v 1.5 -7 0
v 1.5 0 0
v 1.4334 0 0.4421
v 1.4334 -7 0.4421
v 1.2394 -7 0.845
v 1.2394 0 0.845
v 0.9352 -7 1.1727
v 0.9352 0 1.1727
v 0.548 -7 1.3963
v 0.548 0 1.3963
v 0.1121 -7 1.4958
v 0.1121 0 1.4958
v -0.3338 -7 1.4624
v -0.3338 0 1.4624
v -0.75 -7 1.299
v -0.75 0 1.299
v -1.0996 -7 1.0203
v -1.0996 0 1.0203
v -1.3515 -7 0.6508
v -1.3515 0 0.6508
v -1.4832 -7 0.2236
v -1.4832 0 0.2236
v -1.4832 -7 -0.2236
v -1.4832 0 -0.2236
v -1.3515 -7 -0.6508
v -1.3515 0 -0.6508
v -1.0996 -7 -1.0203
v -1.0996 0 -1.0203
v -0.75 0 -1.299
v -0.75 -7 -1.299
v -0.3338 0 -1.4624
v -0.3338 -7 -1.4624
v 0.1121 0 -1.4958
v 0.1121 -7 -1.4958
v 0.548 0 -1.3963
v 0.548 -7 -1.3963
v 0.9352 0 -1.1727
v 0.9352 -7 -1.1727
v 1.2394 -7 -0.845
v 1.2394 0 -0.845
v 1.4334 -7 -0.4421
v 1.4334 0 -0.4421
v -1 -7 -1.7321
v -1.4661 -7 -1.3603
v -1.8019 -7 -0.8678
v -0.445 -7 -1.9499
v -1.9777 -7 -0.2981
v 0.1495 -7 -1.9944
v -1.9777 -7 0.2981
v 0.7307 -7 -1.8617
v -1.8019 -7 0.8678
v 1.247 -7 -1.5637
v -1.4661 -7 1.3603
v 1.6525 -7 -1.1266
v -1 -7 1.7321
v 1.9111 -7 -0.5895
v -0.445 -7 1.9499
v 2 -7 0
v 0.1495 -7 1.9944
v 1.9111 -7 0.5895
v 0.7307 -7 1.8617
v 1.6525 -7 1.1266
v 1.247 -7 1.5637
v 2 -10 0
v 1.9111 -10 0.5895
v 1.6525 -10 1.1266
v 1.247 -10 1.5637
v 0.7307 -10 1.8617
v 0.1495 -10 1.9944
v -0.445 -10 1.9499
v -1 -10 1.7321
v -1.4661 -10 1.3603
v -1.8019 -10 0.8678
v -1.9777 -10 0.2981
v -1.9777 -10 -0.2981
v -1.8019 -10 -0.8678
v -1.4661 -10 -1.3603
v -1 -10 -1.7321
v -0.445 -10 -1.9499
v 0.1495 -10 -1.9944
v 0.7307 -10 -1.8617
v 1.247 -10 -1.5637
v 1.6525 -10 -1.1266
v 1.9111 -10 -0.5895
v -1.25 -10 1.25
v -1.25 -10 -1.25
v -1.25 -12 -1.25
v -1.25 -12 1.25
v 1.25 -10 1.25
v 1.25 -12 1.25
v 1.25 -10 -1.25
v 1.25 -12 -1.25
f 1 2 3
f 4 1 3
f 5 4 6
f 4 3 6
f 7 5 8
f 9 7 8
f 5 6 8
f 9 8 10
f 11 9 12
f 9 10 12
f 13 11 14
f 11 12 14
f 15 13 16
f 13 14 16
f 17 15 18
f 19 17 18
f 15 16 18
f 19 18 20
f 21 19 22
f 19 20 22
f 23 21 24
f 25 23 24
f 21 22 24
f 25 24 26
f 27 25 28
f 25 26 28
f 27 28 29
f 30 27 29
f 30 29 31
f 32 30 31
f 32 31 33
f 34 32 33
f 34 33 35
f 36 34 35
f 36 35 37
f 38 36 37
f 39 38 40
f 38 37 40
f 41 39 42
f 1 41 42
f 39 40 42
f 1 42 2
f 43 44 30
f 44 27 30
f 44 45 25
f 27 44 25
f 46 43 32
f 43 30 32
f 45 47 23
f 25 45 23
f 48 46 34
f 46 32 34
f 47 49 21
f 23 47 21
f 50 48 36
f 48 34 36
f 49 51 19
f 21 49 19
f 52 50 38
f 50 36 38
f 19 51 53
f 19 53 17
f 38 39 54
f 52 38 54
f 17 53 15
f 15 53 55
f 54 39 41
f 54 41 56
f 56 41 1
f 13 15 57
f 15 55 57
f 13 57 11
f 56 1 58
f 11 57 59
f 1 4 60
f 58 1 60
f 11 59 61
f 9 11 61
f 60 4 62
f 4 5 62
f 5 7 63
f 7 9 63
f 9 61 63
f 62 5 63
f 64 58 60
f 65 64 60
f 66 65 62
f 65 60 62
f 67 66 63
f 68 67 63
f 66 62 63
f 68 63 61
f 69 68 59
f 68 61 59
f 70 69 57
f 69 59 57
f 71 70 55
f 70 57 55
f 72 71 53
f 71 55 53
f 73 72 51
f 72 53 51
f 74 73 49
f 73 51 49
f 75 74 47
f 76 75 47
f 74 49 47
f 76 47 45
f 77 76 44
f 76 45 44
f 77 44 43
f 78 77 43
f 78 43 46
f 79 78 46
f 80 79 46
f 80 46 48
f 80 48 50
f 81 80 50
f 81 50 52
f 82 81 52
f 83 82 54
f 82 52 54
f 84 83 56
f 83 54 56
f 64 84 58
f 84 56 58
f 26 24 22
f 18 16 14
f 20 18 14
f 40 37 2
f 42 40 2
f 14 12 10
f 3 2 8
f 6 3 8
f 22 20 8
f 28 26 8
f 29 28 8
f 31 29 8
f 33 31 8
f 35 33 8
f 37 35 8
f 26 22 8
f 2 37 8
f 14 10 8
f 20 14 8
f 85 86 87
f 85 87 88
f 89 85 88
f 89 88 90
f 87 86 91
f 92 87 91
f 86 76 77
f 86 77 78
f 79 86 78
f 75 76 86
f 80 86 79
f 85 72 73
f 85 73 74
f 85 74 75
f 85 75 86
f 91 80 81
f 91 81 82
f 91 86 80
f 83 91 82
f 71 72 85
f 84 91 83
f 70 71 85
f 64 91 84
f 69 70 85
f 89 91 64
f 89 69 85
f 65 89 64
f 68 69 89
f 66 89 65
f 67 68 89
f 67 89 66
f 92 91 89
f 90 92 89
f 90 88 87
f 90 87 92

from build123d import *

# Parameters (mm, degrees)
F0_R     = 1.5
F1_DEPTH = 7
F2_R     = 2
F3_DEPTH = 3
F4_W     = 2.5
F4_H     = 2.5
F5_DEPTH = 2


with BuildPart() as f1:
    # F0 (on Front) → F1 (new body)
    with BuildSketch(Plane.XZ):
        Circle(F0_R)
    extrude(amount=F1_DEPTH)

    # F2 (on face) → F3 (join)
    with BuildSketch(Plane.XZ.offset(7)):
        Circle(F2_R)
    extrude(amount=F3_DEPTH)

    # F4 (on face) → F5 (join)
    with BuildSketch(Plane.XZ.offset(10)):
        Rectangle(F4_W, F4_H)
    extrude(amount=F5_DEPTH)


solid = f1.part
